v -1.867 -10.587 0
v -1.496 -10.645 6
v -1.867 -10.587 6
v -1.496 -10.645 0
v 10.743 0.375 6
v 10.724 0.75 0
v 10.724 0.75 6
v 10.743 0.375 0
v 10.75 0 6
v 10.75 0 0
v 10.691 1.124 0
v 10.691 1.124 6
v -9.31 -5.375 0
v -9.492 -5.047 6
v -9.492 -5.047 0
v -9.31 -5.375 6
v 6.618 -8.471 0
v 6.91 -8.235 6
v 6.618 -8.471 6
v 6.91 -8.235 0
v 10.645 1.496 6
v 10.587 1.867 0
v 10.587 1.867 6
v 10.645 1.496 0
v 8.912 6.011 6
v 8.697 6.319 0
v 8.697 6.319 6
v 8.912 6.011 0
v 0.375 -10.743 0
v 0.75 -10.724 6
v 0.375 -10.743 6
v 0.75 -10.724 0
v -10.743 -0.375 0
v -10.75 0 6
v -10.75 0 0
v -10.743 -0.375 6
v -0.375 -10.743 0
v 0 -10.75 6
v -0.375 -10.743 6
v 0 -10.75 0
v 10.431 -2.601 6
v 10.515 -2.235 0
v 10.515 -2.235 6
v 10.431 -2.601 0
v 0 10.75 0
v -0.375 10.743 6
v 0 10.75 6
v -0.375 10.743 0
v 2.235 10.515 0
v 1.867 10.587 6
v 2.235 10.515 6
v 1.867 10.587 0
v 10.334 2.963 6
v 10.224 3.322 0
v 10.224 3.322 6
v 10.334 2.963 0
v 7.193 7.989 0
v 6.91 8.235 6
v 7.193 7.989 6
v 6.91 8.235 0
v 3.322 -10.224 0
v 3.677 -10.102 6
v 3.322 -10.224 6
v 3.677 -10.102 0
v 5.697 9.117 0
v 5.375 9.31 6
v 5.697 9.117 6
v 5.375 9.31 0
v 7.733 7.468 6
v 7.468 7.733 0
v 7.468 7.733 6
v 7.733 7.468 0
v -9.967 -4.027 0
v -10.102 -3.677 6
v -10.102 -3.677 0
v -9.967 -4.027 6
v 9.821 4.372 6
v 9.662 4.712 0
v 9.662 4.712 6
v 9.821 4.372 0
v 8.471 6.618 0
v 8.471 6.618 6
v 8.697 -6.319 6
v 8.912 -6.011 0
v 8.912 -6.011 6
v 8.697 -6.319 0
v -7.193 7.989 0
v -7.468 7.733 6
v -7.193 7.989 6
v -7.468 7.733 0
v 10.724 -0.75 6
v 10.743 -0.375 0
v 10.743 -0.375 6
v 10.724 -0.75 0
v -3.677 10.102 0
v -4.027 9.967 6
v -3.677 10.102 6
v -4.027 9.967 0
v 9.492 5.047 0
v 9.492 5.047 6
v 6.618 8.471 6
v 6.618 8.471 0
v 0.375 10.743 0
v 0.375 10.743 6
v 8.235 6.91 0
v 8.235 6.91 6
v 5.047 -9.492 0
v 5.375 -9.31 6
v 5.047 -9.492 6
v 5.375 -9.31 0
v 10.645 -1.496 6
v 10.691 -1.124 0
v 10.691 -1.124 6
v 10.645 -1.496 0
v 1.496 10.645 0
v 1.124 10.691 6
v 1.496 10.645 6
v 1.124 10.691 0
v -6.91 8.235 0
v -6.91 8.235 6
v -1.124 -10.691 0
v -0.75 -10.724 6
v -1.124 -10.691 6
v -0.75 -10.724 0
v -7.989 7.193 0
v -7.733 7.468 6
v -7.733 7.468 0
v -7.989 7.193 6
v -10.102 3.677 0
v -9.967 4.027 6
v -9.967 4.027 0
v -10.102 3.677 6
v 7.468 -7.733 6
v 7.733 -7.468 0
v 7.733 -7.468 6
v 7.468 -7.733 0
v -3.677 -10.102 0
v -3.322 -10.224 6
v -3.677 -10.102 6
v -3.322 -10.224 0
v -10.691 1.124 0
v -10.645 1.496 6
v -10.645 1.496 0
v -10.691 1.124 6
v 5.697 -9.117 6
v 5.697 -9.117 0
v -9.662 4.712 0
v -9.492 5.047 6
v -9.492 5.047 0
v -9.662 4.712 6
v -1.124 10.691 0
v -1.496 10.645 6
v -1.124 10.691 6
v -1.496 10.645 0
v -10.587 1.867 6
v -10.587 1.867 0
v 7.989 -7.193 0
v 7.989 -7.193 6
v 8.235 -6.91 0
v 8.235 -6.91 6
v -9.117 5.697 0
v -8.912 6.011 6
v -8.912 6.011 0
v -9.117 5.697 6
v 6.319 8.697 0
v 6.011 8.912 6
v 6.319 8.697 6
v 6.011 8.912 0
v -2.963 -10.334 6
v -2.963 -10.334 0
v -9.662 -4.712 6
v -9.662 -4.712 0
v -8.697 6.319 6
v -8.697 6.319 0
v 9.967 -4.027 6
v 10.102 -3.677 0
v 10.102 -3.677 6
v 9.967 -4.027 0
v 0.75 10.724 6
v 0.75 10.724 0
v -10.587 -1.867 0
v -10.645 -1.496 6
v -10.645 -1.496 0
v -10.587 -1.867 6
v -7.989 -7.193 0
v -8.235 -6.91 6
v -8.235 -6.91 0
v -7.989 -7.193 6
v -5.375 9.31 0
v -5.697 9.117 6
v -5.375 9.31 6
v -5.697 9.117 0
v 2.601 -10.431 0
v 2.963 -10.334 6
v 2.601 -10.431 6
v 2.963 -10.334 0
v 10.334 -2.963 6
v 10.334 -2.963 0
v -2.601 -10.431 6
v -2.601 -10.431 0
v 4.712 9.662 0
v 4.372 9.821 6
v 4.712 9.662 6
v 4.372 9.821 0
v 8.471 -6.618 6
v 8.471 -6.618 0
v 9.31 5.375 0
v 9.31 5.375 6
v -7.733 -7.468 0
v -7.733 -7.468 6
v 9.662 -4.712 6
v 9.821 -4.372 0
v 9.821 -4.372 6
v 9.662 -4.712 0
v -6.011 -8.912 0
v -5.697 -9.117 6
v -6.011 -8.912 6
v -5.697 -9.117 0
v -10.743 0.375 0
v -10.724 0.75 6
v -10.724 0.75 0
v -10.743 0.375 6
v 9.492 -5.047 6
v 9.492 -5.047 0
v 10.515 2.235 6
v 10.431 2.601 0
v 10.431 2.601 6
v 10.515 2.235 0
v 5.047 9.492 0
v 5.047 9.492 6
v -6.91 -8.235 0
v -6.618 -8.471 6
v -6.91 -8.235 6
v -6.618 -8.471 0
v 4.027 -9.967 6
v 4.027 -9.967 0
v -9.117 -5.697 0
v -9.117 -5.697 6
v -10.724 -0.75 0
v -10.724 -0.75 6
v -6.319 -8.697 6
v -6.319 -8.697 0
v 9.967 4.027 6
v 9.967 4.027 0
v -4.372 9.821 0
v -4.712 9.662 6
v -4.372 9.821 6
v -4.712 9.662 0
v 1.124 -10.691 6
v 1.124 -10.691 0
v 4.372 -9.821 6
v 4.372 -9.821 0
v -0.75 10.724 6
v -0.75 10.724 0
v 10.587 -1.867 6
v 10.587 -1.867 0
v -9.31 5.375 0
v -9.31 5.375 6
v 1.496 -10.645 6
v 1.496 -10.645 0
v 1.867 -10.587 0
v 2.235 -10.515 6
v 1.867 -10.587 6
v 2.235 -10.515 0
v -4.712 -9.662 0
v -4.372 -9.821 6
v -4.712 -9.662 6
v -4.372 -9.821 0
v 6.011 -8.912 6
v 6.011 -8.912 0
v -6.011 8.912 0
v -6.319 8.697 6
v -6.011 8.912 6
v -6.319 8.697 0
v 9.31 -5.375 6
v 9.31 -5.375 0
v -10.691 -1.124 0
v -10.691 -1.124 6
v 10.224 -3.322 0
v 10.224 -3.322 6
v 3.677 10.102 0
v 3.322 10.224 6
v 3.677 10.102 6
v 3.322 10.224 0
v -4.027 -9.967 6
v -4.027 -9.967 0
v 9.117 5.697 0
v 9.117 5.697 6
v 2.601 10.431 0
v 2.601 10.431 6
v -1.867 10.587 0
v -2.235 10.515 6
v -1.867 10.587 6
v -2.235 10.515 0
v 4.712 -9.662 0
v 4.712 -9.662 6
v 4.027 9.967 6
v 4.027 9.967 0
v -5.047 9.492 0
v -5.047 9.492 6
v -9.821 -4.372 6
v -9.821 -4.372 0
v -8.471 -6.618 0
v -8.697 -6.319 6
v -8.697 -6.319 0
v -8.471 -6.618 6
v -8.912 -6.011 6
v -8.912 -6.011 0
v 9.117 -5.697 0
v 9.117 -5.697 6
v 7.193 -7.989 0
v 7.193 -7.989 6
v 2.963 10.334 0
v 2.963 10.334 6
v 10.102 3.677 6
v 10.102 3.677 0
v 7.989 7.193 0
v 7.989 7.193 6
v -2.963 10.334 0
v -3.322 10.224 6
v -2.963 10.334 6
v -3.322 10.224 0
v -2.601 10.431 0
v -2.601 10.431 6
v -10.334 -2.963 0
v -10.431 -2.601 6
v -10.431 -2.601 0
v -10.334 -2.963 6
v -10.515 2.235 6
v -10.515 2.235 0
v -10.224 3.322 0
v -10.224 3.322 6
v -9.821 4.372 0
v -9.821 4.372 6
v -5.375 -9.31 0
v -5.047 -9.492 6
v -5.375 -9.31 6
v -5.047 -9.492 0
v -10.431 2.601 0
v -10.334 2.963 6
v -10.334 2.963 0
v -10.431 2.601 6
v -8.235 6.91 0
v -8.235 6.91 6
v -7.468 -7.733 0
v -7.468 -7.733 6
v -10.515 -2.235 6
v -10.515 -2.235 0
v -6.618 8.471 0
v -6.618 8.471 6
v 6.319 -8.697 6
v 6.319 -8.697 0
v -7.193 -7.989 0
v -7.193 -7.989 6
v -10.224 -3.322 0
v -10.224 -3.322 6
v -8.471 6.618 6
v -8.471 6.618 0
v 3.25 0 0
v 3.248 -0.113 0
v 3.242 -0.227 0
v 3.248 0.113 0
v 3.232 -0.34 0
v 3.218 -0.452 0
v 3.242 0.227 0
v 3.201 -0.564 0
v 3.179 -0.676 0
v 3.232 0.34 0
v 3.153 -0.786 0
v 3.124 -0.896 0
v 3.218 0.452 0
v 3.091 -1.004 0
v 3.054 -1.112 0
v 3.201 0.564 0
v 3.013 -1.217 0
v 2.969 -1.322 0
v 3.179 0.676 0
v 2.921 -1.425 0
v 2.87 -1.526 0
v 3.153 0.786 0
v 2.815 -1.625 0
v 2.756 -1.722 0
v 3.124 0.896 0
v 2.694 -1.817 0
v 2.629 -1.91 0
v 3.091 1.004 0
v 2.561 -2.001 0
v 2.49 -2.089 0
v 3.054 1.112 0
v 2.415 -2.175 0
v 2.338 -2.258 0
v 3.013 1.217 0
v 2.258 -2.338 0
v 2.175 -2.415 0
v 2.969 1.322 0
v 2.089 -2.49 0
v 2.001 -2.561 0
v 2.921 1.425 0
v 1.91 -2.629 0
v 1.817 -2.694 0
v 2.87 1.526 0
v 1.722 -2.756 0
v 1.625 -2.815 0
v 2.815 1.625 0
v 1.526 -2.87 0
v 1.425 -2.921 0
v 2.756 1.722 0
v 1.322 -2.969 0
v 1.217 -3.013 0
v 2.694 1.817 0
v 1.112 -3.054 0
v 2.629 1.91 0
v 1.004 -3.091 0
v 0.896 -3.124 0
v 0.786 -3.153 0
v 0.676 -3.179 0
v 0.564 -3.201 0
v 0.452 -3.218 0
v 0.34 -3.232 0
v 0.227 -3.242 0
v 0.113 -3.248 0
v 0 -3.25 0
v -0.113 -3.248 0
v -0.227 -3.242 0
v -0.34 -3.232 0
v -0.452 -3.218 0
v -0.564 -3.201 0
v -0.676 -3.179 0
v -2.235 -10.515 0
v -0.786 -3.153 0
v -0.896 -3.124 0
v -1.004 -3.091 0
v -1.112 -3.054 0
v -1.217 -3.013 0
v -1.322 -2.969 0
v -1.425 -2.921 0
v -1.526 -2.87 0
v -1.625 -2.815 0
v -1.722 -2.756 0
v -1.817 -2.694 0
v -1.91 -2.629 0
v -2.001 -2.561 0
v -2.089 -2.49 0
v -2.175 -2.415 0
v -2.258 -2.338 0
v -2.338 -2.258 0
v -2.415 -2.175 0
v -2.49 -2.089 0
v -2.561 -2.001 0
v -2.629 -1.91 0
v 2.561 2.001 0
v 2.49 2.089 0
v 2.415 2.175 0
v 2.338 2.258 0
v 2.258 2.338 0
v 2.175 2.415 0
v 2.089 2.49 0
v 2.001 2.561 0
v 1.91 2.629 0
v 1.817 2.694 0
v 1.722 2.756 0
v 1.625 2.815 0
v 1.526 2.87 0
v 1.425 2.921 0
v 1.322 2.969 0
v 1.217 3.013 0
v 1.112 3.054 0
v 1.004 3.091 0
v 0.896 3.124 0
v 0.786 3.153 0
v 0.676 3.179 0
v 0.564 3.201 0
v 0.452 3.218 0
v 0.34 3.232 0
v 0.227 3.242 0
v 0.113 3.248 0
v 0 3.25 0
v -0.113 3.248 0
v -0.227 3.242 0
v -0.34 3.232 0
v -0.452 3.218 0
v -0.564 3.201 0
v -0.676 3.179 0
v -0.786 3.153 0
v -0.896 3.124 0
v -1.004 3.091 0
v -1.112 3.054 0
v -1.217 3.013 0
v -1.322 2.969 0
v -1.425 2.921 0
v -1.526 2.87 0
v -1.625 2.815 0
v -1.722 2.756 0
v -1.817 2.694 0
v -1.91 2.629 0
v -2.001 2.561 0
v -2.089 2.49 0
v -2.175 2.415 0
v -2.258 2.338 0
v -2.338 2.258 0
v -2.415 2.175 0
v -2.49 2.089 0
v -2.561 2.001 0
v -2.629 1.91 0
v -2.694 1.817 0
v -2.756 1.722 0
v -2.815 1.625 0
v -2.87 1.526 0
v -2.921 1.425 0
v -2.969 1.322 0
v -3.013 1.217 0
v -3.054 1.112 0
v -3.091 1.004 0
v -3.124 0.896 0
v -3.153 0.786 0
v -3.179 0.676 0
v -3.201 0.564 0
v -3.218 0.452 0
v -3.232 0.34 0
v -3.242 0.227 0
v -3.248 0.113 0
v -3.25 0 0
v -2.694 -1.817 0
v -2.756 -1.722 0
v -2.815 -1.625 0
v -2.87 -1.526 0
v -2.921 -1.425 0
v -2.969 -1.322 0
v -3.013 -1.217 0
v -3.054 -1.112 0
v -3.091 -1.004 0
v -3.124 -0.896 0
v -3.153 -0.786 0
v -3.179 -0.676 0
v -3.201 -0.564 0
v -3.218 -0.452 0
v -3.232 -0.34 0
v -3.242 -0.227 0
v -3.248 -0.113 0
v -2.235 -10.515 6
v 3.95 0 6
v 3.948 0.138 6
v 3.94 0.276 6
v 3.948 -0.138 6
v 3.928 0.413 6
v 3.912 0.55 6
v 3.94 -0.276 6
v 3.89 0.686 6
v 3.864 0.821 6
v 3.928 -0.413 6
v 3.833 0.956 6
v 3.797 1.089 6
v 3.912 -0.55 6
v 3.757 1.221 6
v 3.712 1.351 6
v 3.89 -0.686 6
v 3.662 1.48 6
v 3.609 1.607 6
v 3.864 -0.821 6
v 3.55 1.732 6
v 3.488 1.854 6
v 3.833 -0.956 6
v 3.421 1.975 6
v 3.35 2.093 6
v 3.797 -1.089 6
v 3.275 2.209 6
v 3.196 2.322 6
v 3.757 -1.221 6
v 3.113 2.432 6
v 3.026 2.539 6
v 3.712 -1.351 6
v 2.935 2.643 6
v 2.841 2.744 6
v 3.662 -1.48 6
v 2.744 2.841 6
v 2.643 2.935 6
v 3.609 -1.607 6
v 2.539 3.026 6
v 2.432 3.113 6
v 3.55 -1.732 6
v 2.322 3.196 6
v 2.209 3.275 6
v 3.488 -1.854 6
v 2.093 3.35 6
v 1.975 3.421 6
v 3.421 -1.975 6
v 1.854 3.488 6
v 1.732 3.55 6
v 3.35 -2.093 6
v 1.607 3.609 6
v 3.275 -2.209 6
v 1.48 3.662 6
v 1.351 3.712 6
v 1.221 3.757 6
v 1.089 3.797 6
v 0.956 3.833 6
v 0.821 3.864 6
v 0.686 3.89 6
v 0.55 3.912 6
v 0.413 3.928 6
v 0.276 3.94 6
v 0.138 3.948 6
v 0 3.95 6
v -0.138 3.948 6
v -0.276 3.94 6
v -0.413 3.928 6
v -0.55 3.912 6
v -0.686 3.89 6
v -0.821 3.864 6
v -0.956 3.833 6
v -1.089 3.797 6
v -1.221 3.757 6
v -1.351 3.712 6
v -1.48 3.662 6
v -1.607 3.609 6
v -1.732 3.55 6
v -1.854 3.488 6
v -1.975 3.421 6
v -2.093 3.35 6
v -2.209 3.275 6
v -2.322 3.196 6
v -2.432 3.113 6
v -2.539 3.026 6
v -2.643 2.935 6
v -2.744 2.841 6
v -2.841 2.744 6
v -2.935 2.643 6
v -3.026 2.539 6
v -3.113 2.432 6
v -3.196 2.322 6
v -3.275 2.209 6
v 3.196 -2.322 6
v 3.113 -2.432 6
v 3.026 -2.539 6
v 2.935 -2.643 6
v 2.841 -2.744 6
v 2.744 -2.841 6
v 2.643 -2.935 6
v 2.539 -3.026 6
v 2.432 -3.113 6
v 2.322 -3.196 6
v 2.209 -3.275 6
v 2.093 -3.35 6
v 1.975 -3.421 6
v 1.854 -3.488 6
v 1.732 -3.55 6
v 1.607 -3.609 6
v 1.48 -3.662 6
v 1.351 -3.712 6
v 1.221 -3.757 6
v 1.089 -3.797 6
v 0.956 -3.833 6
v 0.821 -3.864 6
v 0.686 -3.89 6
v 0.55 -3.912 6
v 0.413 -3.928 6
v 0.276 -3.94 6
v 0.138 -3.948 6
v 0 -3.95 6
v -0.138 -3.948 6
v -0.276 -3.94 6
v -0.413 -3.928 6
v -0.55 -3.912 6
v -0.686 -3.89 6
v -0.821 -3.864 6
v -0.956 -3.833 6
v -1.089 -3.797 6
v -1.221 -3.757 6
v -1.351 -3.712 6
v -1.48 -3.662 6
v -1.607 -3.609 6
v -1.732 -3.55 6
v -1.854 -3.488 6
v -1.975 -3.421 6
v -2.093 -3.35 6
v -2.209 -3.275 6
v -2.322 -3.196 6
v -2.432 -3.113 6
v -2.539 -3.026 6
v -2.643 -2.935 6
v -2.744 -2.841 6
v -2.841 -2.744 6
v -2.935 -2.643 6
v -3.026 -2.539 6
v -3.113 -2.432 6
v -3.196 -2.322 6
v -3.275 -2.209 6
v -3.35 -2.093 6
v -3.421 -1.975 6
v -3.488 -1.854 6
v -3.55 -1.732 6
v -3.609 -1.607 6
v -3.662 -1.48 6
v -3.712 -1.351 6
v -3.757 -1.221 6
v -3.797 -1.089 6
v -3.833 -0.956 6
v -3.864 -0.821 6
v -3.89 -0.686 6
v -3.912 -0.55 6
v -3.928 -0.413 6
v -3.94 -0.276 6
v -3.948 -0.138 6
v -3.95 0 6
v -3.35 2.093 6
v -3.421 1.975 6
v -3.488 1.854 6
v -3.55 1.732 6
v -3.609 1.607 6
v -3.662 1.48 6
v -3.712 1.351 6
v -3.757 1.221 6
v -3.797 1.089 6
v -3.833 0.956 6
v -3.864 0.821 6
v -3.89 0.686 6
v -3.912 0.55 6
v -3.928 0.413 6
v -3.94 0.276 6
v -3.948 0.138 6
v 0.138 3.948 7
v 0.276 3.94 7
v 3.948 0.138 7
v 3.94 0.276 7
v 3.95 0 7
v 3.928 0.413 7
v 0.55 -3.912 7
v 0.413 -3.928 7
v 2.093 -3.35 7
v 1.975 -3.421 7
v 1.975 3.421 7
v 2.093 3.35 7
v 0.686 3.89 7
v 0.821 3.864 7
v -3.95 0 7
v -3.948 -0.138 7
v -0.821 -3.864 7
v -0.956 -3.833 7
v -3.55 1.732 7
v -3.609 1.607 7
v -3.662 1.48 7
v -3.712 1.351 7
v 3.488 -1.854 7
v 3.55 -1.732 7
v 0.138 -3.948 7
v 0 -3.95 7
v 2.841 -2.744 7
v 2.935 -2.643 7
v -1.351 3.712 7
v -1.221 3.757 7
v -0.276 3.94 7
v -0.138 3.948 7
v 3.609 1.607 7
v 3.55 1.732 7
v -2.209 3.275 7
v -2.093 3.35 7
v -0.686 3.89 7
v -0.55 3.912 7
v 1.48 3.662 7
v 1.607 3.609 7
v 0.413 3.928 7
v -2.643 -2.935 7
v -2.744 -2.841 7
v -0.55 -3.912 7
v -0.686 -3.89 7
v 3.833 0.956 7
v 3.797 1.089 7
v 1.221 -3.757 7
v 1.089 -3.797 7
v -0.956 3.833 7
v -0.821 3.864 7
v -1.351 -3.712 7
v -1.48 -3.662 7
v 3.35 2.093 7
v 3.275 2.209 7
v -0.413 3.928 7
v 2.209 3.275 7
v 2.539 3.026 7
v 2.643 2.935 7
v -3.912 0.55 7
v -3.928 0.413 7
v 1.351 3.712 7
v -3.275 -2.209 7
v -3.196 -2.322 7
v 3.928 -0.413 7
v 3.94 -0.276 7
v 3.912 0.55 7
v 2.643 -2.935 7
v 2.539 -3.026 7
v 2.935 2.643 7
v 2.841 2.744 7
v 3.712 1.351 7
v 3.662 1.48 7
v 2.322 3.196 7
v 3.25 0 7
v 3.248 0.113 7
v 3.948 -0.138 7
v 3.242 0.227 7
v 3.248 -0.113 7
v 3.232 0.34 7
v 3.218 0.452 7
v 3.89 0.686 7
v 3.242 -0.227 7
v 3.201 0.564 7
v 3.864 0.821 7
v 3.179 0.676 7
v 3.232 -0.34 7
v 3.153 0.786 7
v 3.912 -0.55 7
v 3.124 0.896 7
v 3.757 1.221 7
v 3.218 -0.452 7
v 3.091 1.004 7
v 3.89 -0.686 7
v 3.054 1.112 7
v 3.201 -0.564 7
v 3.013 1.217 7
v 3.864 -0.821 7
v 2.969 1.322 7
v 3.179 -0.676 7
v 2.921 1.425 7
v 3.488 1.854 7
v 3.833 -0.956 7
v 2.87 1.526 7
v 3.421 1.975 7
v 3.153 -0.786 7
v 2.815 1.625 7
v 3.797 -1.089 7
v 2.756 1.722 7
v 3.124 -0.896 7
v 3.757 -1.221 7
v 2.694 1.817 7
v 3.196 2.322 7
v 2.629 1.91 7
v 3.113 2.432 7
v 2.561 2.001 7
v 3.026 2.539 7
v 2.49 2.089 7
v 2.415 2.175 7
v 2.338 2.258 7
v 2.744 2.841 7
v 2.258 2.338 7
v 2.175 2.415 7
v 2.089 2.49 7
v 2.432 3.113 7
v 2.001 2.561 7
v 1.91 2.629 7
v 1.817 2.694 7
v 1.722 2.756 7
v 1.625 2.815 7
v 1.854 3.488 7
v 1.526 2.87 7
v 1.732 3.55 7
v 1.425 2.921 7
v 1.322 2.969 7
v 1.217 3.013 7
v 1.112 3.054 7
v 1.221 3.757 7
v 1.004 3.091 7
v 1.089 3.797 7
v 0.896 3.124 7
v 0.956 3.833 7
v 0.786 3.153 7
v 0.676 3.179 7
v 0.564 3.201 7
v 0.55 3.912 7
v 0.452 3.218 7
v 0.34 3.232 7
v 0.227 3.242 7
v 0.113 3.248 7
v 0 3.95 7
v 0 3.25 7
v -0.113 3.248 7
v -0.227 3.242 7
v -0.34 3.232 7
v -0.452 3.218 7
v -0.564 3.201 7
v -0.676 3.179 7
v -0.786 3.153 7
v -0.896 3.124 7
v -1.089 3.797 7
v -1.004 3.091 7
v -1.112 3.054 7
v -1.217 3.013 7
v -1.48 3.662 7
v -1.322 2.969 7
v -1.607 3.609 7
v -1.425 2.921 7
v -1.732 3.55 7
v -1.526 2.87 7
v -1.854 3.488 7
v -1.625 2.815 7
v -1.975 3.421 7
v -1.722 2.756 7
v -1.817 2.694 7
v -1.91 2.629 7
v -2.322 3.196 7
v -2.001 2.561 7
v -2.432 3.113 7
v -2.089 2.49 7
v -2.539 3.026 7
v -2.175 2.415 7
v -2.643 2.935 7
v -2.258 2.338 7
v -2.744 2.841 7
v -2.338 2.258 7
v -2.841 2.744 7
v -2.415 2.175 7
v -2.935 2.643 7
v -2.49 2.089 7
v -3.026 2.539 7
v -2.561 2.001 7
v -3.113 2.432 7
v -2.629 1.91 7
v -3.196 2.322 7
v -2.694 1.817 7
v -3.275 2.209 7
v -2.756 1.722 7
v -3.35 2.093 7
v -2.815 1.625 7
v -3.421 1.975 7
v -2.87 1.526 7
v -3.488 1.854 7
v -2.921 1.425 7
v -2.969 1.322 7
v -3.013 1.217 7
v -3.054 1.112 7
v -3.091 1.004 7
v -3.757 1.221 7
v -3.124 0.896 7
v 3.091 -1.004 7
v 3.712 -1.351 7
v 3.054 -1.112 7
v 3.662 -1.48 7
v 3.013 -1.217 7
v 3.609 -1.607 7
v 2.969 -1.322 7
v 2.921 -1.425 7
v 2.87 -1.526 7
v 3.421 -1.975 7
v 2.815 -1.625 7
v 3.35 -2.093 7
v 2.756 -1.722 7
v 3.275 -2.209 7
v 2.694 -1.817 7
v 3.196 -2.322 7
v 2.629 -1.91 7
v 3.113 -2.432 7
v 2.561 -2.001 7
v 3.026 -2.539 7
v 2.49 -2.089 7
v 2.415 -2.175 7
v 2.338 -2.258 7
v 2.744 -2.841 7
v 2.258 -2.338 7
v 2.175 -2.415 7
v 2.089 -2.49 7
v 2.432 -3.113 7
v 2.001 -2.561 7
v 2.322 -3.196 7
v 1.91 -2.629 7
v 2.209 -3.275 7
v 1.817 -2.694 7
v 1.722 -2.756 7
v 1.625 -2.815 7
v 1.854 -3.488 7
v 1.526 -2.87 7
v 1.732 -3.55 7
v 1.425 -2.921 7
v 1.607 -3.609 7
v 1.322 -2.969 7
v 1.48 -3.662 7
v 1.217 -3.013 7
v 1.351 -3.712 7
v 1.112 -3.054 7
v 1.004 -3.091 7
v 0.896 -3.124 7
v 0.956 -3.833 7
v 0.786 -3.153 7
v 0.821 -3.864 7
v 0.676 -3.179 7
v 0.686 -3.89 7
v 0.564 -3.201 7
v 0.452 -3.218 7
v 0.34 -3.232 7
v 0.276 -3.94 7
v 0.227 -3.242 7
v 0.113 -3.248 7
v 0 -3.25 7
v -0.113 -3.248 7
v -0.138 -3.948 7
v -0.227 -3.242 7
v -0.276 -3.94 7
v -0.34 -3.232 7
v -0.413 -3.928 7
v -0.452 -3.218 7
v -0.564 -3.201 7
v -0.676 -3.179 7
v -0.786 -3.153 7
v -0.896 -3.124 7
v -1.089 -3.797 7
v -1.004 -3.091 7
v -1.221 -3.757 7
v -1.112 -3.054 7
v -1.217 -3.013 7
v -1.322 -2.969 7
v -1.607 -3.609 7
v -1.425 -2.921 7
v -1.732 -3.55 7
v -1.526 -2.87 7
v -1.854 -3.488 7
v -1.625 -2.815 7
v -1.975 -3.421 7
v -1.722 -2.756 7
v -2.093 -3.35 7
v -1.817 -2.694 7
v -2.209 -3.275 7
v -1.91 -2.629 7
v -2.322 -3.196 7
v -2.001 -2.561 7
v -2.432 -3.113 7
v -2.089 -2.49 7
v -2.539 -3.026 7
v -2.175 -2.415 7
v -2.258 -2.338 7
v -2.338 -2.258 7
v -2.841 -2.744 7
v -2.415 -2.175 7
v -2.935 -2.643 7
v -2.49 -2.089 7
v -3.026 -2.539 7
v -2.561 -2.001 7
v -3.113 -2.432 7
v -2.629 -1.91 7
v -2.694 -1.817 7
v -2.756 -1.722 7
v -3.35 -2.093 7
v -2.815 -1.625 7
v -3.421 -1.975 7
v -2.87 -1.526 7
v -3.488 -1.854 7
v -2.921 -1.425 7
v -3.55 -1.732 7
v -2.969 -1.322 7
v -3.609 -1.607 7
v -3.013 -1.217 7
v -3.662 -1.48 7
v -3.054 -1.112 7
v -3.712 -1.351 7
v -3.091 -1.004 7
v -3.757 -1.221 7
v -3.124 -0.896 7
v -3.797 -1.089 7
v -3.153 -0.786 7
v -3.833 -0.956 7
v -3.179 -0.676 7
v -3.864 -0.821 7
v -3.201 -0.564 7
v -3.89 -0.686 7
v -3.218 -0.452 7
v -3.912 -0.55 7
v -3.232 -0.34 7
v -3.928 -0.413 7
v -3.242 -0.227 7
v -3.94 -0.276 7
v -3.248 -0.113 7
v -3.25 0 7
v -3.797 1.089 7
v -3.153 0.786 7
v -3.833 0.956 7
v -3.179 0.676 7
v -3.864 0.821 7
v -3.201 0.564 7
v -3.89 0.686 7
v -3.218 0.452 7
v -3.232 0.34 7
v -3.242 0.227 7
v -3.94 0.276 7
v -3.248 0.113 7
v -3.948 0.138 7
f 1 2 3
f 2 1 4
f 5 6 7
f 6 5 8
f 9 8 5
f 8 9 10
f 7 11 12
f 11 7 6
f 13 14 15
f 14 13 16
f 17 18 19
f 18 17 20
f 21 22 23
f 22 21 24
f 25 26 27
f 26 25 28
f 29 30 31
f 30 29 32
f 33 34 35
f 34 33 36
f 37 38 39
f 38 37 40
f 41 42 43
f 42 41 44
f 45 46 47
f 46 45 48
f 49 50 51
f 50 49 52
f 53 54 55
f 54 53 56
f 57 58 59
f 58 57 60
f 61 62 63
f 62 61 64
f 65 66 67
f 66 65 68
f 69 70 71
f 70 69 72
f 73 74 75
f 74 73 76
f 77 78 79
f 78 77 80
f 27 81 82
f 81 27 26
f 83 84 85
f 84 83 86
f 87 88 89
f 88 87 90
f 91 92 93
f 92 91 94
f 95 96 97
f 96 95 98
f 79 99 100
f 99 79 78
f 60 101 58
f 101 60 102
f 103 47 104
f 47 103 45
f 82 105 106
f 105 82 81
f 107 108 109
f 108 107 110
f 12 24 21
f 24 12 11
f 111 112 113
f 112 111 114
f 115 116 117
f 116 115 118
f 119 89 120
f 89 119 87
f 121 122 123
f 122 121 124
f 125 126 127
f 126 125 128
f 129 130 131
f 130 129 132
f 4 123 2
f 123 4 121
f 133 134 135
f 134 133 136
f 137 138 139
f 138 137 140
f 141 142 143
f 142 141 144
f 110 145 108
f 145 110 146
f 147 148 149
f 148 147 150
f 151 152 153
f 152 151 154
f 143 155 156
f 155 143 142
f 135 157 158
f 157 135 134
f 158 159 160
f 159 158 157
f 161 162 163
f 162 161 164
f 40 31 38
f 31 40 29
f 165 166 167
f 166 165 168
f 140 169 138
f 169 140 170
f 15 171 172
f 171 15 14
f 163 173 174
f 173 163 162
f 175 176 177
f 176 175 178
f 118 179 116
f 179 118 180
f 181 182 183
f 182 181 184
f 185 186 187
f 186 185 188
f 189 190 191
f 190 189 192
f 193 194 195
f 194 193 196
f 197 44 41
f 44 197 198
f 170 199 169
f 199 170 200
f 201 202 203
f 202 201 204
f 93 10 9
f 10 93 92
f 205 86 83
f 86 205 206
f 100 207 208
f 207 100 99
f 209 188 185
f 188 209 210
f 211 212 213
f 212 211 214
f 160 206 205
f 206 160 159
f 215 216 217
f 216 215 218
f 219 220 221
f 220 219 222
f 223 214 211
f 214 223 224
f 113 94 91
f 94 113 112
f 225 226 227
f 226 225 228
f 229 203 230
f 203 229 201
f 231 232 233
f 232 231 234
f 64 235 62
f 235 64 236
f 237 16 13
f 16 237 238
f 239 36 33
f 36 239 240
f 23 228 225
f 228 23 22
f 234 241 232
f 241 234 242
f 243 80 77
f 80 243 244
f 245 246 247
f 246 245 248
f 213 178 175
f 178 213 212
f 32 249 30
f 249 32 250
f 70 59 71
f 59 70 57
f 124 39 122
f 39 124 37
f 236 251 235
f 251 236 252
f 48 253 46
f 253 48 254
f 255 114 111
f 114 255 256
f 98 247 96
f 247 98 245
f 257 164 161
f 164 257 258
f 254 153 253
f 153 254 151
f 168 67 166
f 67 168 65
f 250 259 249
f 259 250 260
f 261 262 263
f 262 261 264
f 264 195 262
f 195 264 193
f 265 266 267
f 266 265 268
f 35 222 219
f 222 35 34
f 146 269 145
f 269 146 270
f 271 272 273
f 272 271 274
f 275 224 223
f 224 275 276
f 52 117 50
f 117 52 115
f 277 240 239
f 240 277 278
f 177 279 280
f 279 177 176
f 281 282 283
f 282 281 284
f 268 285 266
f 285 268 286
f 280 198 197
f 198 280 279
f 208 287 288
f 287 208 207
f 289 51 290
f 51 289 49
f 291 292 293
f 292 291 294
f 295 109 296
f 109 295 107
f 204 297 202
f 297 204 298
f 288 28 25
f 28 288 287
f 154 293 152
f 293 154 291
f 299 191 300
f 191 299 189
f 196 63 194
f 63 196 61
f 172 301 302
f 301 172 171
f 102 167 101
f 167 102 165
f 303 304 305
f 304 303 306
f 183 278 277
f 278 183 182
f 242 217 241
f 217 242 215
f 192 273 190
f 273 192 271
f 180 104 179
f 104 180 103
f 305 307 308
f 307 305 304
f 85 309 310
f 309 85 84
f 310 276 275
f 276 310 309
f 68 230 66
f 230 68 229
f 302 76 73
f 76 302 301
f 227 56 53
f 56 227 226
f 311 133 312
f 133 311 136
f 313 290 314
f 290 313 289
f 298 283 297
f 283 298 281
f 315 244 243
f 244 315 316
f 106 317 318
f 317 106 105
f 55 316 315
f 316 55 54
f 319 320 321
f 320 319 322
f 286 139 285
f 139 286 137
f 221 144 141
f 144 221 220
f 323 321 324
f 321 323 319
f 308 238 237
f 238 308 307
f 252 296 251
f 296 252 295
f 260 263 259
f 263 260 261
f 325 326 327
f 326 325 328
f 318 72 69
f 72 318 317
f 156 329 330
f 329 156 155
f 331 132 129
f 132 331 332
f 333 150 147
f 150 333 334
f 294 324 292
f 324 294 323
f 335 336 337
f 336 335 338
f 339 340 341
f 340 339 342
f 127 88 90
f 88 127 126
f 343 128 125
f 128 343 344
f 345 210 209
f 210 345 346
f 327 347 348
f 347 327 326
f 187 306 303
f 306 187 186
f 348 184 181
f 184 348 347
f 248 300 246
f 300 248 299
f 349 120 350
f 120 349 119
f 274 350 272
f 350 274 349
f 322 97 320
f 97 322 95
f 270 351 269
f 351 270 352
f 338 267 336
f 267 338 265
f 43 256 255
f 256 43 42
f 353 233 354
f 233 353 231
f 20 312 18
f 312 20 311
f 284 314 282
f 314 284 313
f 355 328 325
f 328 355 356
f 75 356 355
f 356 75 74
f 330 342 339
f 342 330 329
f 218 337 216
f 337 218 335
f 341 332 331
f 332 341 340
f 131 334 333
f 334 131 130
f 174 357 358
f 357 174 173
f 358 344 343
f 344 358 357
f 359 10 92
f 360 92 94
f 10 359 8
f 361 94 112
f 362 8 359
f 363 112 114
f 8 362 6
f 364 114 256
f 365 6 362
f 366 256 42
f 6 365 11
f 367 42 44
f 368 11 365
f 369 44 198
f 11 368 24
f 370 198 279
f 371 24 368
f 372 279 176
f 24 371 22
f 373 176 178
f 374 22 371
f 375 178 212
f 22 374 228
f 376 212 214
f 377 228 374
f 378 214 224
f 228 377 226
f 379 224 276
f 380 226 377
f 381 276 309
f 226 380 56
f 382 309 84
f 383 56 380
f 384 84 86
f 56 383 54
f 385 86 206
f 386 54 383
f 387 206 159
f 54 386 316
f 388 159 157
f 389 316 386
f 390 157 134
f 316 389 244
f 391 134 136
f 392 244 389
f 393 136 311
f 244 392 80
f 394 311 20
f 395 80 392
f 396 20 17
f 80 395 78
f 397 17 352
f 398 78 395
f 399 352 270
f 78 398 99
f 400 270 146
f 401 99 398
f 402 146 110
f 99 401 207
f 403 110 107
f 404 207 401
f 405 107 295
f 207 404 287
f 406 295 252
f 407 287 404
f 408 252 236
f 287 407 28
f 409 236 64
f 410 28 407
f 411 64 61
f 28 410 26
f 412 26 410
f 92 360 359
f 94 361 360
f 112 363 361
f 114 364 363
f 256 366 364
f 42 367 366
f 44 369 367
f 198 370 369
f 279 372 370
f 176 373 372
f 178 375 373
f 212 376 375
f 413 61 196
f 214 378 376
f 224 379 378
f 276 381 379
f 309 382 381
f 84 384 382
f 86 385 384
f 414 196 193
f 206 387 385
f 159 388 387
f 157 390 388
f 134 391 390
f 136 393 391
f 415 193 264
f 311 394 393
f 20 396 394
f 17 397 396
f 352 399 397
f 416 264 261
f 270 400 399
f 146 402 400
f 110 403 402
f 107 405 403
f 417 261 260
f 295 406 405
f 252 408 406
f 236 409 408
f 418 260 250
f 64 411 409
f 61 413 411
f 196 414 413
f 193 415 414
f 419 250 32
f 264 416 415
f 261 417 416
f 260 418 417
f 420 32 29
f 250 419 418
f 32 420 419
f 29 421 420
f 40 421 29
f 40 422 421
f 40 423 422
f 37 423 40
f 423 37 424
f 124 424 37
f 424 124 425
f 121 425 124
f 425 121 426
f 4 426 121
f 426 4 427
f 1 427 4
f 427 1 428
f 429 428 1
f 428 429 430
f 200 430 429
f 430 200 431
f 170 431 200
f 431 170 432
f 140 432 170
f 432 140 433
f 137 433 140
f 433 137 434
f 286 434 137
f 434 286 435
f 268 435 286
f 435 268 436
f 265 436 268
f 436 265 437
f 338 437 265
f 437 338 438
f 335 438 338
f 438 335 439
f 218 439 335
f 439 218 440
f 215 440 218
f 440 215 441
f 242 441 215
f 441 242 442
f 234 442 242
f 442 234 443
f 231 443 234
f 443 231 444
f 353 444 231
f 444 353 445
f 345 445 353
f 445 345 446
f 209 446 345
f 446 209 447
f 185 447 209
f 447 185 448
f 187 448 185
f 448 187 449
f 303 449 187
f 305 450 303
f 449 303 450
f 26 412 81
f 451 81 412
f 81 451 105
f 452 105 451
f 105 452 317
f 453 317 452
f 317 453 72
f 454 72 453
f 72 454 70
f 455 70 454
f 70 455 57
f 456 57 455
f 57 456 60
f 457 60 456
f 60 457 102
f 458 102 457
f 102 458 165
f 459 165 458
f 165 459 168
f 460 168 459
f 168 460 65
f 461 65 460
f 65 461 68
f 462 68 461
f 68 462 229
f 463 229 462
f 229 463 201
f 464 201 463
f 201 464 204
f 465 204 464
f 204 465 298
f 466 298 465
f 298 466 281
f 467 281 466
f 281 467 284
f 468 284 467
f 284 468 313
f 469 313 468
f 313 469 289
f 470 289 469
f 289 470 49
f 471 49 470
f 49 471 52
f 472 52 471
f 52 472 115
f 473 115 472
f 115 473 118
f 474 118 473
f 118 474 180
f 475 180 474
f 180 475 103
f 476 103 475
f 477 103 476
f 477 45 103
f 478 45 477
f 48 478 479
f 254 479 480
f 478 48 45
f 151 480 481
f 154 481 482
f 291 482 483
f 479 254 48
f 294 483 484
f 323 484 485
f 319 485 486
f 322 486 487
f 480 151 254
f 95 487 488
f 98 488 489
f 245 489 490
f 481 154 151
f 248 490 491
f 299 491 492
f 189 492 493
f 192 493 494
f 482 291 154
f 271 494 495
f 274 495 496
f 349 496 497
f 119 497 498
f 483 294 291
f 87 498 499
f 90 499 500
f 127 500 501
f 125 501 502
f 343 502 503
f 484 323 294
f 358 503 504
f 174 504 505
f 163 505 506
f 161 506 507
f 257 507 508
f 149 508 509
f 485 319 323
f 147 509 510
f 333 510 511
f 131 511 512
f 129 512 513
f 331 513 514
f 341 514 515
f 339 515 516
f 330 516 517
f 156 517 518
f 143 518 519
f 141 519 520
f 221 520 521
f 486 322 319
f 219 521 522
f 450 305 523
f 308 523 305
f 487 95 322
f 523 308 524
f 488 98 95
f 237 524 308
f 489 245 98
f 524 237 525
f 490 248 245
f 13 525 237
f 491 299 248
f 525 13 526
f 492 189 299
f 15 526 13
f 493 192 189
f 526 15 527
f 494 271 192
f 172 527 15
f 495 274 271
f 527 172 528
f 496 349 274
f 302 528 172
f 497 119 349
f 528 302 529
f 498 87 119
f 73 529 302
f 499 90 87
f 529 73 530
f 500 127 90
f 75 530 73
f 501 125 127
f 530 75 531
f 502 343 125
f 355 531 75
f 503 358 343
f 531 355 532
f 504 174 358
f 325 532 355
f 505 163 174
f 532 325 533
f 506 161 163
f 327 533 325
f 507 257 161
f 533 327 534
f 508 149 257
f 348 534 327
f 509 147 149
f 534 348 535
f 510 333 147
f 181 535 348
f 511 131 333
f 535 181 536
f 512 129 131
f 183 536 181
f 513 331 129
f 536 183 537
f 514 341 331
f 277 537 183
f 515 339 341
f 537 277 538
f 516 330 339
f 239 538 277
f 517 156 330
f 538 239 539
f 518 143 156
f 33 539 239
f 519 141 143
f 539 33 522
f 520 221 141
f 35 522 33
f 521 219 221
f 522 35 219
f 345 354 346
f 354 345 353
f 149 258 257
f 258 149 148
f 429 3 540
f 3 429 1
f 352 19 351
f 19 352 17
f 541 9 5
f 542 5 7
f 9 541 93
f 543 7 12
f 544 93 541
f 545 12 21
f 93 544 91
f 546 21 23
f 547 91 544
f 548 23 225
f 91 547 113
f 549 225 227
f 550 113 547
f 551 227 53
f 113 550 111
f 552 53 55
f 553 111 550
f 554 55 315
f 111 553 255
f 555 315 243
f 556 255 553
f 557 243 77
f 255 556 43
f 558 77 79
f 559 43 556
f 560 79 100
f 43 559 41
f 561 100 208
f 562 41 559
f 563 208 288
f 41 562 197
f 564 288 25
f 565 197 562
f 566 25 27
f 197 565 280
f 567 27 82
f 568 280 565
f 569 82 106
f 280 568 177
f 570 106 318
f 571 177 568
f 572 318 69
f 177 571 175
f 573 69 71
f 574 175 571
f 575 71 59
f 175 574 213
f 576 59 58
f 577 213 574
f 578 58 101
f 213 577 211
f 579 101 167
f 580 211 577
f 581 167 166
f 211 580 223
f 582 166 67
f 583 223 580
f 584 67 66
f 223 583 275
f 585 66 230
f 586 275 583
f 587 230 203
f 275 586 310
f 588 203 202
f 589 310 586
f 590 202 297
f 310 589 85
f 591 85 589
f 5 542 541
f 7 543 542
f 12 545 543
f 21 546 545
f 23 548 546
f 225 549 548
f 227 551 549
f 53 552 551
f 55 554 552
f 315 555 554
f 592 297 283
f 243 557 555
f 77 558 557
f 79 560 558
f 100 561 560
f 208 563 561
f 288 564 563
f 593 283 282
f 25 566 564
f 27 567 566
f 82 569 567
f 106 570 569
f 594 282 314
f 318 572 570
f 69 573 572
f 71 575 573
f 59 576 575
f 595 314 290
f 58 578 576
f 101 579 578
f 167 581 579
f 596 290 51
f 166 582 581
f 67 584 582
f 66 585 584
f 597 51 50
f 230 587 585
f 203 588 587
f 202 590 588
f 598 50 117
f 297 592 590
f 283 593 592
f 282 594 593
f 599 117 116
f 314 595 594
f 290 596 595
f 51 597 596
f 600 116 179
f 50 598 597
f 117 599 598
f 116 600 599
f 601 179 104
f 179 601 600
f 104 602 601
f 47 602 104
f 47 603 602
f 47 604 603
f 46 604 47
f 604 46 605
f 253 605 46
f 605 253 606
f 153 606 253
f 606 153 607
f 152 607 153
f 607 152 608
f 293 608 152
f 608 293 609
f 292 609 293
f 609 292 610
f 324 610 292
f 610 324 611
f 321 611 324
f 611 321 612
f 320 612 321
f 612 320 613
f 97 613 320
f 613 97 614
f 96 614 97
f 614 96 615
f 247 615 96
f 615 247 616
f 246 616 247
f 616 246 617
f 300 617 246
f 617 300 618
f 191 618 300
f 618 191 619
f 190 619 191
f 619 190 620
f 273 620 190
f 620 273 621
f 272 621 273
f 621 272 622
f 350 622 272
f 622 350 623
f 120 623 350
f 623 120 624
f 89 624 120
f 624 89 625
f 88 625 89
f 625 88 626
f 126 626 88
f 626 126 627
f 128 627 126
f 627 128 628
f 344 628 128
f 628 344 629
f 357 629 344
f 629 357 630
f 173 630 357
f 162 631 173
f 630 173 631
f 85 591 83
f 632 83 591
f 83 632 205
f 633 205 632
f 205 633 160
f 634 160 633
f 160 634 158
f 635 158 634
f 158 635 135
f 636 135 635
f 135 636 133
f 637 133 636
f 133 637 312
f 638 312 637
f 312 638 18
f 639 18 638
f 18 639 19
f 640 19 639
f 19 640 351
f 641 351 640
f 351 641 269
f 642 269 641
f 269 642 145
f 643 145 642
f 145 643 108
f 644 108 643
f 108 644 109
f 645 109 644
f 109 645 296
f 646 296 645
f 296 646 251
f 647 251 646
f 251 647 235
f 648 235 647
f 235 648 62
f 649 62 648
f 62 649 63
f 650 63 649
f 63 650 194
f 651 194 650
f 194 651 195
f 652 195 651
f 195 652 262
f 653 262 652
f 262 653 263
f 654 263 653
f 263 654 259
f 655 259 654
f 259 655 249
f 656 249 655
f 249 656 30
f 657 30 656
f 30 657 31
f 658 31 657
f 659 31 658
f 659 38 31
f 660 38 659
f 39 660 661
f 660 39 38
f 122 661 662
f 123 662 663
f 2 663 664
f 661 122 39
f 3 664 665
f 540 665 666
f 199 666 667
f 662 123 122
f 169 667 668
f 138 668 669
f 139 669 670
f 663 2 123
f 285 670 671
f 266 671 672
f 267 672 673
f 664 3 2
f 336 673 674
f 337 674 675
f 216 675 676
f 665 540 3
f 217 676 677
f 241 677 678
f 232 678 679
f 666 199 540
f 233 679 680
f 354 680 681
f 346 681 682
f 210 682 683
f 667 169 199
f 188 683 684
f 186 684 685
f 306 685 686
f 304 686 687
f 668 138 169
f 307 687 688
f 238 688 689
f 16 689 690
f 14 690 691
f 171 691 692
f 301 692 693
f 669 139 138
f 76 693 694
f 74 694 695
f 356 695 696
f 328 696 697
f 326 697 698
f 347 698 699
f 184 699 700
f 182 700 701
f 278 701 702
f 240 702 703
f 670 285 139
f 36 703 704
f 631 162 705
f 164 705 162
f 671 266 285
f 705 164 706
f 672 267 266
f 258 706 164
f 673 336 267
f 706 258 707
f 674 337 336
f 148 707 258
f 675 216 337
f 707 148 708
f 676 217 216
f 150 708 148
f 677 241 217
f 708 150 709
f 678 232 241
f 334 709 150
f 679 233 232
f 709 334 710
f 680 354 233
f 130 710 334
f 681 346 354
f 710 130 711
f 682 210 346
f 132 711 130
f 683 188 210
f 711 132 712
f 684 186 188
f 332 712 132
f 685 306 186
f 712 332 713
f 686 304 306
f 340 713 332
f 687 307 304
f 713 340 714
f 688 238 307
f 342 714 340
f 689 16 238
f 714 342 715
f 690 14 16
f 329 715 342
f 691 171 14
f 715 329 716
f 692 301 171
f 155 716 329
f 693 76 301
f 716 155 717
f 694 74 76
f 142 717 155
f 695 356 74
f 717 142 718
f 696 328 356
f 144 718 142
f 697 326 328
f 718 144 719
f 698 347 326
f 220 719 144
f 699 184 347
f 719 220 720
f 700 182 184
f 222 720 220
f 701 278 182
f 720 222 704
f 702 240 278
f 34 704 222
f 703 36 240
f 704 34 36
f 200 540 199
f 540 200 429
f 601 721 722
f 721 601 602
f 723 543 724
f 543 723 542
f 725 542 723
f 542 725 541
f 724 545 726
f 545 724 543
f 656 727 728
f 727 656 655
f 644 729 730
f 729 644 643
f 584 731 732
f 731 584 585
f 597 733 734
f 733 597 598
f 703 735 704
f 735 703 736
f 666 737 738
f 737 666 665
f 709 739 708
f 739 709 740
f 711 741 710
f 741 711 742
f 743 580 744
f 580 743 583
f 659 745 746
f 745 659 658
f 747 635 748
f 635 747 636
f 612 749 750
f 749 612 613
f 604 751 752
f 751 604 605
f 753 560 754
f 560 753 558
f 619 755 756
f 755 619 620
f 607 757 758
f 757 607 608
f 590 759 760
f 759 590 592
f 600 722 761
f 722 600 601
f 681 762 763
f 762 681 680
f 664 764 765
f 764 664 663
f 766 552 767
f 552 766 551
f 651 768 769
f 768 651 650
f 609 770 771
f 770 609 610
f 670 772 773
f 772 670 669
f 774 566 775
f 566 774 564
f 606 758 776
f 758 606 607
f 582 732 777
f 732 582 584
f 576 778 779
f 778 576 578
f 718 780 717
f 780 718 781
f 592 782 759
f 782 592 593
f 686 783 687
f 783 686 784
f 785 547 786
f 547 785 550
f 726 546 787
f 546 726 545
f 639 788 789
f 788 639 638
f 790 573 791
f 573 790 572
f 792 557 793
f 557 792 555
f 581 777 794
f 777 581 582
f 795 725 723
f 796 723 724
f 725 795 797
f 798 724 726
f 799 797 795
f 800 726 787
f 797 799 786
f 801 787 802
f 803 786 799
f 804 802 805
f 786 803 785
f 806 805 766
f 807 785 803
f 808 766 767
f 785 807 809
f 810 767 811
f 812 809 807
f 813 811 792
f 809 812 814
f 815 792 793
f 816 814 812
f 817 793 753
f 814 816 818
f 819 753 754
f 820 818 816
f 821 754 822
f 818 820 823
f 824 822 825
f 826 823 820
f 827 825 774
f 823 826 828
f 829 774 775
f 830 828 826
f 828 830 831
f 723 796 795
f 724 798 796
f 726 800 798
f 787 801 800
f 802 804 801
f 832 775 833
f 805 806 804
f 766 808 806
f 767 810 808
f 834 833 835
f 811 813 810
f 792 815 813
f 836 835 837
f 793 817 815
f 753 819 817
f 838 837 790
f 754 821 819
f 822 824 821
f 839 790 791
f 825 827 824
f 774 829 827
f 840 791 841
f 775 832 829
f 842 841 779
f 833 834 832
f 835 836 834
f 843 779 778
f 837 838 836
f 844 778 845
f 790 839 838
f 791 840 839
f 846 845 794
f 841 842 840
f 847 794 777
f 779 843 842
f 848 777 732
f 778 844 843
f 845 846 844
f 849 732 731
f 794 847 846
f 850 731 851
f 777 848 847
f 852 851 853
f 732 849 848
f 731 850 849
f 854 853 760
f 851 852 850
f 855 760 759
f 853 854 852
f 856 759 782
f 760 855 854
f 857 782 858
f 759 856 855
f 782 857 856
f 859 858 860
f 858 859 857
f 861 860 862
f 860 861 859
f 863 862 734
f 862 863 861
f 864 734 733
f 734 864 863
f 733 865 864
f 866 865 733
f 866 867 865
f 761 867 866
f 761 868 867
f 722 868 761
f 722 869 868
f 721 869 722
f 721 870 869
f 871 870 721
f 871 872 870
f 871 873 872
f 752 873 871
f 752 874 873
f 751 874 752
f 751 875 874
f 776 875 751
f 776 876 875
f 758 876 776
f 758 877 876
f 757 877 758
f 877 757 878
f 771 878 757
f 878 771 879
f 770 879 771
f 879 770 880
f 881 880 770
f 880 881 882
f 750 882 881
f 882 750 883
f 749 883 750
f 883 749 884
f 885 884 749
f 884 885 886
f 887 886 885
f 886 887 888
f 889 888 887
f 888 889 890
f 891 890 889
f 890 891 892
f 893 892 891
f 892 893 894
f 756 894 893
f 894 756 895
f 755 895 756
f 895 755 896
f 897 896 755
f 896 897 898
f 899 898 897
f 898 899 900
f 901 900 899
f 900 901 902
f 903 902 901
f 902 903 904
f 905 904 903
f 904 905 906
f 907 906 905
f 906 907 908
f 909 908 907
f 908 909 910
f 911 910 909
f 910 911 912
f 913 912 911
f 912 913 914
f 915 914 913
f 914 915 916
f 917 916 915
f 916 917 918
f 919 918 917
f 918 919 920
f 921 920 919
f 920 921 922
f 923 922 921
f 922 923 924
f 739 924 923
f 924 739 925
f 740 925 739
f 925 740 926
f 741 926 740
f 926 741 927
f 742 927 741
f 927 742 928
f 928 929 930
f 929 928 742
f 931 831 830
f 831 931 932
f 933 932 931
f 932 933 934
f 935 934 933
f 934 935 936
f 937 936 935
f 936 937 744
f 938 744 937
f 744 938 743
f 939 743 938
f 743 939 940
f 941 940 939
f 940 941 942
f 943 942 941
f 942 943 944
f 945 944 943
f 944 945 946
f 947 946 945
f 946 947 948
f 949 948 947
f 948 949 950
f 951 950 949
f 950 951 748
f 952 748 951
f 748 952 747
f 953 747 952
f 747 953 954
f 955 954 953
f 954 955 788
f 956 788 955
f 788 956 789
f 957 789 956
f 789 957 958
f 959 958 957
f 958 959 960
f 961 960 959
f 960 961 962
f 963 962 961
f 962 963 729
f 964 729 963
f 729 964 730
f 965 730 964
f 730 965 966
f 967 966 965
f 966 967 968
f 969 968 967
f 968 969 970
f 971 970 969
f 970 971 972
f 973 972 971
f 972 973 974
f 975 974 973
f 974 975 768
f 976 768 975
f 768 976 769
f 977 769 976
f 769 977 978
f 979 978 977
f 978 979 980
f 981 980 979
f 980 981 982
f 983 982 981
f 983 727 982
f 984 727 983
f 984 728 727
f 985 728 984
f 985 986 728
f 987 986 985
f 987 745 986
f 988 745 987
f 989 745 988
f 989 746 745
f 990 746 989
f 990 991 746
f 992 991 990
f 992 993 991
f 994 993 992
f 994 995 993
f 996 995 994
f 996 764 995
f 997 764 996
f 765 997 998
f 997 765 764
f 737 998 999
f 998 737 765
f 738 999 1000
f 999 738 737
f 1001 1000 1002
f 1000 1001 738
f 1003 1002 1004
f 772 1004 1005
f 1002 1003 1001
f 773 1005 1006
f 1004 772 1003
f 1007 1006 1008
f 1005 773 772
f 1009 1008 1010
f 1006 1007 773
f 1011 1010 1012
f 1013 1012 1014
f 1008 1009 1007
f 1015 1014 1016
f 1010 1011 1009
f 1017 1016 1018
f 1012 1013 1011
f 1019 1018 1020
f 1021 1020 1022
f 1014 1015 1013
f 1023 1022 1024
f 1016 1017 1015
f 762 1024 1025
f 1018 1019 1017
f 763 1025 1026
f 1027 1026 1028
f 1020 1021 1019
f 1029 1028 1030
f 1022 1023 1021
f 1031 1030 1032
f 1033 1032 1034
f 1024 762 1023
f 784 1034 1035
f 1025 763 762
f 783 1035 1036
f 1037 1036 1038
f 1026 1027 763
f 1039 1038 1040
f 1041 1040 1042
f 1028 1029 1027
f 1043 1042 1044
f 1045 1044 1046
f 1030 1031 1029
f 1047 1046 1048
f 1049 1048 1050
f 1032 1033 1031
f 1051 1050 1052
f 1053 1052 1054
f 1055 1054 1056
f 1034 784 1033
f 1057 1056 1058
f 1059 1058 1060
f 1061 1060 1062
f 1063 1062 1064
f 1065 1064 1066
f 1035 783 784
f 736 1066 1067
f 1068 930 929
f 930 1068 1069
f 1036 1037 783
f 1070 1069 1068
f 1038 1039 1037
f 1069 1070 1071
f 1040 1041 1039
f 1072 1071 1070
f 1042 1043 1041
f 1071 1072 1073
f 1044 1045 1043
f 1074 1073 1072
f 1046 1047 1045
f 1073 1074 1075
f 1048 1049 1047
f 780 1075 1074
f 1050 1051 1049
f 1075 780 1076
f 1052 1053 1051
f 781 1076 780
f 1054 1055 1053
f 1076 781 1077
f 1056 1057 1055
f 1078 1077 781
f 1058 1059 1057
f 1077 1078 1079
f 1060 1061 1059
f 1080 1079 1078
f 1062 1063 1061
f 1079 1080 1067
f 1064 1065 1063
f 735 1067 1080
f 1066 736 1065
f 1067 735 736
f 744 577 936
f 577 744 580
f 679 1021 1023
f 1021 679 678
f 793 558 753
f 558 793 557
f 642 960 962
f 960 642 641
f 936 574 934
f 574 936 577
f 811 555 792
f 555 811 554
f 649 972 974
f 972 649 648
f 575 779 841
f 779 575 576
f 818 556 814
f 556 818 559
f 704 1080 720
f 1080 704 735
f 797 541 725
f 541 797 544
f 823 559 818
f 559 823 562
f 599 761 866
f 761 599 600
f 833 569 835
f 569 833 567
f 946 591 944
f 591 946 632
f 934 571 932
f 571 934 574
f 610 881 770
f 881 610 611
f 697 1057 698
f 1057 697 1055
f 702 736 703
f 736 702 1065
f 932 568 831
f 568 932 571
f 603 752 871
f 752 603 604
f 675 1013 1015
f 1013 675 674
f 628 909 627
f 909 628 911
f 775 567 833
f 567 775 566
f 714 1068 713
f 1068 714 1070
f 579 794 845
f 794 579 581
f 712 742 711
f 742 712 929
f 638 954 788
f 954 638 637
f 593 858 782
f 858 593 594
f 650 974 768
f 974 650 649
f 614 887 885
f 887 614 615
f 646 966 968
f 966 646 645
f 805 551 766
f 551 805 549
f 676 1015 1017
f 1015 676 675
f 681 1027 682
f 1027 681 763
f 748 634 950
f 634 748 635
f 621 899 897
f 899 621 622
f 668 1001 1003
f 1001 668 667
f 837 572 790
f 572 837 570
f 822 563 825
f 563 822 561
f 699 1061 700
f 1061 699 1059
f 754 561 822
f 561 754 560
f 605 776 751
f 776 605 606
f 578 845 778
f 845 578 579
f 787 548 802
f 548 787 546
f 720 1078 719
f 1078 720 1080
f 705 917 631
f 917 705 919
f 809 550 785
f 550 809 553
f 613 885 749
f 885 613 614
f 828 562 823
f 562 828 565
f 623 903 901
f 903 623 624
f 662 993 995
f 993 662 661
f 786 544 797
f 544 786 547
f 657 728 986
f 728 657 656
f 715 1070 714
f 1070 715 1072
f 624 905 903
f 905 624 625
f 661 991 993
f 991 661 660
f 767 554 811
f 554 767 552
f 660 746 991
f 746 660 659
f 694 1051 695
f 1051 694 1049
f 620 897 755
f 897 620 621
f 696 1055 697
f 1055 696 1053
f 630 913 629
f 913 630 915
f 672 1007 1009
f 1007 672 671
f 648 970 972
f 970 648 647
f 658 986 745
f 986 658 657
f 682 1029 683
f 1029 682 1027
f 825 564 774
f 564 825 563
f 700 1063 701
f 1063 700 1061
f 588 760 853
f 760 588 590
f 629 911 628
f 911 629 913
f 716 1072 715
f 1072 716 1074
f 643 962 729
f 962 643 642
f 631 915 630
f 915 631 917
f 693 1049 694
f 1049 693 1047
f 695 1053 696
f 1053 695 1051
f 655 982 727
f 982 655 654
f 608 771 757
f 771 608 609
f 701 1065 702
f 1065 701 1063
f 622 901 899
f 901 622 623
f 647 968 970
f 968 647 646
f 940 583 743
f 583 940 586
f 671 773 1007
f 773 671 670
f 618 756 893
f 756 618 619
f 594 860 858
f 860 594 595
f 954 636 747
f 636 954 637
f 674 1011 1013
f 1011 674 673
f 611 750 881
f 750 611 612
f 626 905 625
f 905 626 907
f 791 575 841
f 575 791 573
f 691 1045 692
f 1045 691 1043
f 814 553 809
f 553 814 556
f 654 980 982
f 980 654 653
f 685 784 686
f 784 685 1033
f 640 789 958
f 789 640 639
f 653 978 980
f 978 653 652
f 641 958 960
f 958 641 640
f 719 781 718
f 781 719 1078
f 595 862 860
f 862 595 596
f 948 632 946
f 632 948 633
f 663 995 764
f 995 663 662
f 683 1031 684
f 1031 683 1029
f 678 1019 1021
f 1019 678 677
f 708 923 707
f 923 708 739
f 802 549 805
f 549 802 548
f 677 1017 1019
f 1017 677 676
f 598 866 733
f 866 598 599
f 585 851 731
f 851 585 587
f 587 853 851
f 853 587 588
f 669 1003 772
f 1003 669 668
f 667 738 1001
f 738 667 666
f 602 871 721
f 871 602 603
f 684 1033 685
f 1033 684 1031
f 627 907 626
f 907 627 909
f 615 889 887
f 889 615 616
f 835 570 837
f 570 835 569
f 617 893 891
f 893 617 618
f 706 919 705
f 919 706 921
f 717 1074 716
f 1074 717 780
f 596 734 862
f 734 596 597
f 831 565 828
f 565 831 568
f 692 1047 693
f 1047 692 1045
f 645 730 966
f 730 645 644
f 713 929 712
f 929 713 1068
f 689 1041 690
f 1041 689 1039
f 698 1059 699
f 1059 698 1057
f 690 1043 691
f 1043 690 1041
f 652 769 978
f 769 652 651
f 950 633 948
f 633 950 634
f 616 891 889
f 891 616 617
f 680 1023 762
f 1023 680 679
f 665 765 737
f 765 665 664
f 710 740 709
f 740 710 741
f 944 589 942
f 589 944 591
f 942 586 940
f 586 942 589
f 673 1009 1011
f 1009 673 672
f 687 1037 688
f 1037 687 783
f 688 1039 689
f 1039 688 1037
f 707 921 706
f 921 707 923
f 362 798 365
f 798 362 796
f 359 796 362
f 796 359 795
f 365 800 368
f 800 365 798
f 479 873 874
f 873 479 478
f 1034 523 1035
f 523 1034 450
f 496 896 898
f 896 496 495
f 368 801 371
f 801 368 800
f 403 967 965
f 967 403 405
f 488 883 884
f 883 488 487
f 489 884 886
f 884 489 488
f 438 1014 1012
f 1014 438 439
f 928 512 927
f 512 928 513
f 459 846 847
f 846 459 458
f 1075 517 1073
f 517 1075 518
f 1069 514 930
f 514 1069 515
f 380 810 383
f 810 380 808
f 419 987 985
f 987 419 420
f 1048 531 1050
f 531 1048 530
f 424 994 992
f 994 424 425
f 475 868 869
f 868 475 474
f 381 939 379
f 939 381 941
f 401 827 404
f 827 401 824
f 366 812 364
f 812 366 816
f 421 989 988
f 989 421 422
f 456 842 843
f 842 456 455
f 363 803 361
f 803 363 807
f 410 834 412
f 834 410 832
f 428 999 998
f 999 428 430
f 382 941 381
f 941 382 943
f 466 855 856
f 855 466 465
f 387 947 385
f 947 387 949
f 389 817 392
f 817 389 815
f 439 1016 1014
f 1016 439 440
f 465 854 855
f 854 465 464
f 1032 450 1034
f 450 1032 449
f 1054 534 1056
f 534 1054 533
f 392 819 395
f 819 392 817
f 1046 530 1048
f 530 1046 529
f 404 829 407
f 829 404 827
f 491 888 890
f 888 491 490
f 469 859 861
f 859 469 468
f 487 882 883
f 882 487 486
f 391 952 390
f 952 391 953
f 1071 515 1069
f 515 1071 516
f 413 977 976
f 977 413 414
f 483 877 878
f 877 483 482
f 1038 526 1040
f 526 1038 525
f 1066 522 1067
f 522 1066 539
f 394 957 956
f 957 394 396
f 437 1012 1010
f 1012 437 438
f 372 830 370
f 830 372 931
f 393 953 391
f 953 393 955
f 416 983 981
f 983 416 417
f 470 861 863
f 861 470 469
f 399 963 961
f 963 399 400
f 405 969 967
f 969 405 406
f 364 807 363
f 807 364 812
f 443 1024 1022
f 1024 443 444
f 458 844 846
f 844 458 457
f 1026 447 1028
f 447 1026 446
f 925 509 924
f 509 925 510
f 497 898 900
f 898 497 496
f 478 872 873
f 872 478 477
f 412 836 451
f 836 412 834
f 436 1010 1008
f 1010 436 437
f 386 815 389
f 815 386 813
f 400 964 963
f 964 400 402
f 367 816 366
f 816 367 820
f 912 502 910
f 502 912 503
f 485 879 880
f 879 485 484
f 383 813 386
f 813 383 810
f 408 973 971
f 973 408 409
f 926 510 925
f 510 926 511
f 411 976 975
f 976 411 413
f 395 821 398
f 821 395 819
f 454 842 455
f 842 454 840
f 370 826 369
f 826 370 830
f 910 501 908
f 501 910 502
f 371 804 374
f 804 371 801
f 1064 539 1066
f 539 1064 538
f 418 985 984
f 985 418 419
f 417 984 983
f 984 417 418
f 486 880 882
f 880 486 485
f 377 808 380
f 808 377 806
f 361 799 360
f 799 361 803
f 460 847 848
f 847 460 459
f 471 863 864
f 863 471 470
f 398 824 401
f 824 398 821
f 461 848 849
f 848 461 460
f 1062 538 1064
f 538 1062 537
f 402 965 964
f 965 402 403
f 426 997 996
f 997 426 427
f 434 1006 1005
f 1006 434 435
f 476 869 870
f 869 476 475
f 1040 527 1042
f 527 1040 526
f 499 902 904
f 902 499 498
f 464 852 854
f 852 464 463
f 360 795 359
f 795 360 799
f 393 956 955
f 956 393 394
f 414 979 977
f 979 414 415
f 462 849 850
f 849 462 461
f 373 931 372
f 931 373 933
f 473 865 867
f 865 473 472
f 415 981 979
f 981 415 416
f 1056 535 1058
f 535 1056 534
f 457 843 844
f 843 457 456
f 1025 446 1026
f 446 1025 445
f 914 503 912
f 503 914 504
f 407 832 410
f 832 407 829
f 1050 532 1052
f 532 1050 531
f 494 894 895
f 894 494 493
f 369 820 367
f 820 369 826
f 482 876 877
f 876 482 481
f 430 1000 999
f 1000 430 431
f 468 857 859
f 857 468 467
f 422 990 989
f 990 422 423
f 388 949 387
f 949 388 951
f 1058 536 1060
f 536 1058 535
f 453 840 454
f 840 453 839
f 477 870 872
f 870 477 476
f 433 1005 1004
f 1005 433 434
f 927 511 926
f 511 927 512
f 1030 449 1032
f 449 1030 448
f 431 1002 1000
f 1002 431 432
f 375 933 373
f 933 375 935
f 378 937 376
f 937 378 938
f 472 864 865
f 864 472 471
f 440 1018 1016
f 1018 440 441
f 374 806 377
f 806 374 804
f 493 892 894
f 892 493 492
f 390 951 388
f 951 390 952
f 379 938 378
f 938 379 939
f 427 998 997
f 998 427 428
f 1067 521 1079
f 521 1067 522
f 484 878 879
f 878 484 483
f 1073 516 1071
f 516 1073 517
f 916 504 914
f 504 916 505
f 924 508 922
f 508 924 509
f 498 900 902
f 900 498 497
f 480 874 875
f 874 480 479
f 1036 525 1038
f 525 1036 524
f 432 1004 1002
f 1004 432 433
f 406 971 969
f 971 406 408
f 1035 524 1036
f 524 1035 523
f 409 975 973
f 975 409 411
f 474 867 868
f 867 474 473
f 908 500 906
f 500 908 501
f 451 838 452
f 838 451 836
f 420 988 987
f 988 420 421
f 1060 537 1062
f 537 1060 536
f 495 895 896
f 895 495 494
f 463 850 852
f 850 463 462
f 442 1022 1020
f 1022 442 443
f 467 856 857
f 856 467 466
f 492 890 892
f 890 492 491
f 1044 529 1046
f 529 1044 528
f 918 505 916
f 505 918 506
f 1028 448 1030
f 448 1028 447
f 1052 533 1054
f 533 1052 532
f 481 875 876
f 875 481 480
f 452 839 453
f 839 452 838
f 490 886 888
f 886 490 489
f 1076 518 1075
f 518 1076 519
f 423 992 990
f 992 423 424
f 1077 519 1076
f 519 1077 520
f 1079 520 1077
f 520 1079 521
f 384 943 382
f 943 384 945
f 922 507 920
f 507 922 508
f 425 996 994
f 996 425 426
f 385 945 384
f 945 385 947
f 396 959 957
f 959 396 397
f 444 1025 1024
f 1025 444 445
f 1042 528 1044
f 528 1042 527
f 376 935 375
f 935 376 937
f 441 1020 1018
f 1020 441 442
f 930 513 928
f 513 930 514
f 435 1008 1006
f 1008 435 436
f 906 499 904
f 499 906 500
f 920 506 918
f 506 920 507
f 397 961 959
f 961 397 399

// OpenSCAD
$fs = 0.01;
$fa = 2;

difference() {
    union() {
        cylinder(d=21.5, h=6);
        cylinder(d=7.9, h=7);
    }
    cylinder(d=6.5, h=10);
}
